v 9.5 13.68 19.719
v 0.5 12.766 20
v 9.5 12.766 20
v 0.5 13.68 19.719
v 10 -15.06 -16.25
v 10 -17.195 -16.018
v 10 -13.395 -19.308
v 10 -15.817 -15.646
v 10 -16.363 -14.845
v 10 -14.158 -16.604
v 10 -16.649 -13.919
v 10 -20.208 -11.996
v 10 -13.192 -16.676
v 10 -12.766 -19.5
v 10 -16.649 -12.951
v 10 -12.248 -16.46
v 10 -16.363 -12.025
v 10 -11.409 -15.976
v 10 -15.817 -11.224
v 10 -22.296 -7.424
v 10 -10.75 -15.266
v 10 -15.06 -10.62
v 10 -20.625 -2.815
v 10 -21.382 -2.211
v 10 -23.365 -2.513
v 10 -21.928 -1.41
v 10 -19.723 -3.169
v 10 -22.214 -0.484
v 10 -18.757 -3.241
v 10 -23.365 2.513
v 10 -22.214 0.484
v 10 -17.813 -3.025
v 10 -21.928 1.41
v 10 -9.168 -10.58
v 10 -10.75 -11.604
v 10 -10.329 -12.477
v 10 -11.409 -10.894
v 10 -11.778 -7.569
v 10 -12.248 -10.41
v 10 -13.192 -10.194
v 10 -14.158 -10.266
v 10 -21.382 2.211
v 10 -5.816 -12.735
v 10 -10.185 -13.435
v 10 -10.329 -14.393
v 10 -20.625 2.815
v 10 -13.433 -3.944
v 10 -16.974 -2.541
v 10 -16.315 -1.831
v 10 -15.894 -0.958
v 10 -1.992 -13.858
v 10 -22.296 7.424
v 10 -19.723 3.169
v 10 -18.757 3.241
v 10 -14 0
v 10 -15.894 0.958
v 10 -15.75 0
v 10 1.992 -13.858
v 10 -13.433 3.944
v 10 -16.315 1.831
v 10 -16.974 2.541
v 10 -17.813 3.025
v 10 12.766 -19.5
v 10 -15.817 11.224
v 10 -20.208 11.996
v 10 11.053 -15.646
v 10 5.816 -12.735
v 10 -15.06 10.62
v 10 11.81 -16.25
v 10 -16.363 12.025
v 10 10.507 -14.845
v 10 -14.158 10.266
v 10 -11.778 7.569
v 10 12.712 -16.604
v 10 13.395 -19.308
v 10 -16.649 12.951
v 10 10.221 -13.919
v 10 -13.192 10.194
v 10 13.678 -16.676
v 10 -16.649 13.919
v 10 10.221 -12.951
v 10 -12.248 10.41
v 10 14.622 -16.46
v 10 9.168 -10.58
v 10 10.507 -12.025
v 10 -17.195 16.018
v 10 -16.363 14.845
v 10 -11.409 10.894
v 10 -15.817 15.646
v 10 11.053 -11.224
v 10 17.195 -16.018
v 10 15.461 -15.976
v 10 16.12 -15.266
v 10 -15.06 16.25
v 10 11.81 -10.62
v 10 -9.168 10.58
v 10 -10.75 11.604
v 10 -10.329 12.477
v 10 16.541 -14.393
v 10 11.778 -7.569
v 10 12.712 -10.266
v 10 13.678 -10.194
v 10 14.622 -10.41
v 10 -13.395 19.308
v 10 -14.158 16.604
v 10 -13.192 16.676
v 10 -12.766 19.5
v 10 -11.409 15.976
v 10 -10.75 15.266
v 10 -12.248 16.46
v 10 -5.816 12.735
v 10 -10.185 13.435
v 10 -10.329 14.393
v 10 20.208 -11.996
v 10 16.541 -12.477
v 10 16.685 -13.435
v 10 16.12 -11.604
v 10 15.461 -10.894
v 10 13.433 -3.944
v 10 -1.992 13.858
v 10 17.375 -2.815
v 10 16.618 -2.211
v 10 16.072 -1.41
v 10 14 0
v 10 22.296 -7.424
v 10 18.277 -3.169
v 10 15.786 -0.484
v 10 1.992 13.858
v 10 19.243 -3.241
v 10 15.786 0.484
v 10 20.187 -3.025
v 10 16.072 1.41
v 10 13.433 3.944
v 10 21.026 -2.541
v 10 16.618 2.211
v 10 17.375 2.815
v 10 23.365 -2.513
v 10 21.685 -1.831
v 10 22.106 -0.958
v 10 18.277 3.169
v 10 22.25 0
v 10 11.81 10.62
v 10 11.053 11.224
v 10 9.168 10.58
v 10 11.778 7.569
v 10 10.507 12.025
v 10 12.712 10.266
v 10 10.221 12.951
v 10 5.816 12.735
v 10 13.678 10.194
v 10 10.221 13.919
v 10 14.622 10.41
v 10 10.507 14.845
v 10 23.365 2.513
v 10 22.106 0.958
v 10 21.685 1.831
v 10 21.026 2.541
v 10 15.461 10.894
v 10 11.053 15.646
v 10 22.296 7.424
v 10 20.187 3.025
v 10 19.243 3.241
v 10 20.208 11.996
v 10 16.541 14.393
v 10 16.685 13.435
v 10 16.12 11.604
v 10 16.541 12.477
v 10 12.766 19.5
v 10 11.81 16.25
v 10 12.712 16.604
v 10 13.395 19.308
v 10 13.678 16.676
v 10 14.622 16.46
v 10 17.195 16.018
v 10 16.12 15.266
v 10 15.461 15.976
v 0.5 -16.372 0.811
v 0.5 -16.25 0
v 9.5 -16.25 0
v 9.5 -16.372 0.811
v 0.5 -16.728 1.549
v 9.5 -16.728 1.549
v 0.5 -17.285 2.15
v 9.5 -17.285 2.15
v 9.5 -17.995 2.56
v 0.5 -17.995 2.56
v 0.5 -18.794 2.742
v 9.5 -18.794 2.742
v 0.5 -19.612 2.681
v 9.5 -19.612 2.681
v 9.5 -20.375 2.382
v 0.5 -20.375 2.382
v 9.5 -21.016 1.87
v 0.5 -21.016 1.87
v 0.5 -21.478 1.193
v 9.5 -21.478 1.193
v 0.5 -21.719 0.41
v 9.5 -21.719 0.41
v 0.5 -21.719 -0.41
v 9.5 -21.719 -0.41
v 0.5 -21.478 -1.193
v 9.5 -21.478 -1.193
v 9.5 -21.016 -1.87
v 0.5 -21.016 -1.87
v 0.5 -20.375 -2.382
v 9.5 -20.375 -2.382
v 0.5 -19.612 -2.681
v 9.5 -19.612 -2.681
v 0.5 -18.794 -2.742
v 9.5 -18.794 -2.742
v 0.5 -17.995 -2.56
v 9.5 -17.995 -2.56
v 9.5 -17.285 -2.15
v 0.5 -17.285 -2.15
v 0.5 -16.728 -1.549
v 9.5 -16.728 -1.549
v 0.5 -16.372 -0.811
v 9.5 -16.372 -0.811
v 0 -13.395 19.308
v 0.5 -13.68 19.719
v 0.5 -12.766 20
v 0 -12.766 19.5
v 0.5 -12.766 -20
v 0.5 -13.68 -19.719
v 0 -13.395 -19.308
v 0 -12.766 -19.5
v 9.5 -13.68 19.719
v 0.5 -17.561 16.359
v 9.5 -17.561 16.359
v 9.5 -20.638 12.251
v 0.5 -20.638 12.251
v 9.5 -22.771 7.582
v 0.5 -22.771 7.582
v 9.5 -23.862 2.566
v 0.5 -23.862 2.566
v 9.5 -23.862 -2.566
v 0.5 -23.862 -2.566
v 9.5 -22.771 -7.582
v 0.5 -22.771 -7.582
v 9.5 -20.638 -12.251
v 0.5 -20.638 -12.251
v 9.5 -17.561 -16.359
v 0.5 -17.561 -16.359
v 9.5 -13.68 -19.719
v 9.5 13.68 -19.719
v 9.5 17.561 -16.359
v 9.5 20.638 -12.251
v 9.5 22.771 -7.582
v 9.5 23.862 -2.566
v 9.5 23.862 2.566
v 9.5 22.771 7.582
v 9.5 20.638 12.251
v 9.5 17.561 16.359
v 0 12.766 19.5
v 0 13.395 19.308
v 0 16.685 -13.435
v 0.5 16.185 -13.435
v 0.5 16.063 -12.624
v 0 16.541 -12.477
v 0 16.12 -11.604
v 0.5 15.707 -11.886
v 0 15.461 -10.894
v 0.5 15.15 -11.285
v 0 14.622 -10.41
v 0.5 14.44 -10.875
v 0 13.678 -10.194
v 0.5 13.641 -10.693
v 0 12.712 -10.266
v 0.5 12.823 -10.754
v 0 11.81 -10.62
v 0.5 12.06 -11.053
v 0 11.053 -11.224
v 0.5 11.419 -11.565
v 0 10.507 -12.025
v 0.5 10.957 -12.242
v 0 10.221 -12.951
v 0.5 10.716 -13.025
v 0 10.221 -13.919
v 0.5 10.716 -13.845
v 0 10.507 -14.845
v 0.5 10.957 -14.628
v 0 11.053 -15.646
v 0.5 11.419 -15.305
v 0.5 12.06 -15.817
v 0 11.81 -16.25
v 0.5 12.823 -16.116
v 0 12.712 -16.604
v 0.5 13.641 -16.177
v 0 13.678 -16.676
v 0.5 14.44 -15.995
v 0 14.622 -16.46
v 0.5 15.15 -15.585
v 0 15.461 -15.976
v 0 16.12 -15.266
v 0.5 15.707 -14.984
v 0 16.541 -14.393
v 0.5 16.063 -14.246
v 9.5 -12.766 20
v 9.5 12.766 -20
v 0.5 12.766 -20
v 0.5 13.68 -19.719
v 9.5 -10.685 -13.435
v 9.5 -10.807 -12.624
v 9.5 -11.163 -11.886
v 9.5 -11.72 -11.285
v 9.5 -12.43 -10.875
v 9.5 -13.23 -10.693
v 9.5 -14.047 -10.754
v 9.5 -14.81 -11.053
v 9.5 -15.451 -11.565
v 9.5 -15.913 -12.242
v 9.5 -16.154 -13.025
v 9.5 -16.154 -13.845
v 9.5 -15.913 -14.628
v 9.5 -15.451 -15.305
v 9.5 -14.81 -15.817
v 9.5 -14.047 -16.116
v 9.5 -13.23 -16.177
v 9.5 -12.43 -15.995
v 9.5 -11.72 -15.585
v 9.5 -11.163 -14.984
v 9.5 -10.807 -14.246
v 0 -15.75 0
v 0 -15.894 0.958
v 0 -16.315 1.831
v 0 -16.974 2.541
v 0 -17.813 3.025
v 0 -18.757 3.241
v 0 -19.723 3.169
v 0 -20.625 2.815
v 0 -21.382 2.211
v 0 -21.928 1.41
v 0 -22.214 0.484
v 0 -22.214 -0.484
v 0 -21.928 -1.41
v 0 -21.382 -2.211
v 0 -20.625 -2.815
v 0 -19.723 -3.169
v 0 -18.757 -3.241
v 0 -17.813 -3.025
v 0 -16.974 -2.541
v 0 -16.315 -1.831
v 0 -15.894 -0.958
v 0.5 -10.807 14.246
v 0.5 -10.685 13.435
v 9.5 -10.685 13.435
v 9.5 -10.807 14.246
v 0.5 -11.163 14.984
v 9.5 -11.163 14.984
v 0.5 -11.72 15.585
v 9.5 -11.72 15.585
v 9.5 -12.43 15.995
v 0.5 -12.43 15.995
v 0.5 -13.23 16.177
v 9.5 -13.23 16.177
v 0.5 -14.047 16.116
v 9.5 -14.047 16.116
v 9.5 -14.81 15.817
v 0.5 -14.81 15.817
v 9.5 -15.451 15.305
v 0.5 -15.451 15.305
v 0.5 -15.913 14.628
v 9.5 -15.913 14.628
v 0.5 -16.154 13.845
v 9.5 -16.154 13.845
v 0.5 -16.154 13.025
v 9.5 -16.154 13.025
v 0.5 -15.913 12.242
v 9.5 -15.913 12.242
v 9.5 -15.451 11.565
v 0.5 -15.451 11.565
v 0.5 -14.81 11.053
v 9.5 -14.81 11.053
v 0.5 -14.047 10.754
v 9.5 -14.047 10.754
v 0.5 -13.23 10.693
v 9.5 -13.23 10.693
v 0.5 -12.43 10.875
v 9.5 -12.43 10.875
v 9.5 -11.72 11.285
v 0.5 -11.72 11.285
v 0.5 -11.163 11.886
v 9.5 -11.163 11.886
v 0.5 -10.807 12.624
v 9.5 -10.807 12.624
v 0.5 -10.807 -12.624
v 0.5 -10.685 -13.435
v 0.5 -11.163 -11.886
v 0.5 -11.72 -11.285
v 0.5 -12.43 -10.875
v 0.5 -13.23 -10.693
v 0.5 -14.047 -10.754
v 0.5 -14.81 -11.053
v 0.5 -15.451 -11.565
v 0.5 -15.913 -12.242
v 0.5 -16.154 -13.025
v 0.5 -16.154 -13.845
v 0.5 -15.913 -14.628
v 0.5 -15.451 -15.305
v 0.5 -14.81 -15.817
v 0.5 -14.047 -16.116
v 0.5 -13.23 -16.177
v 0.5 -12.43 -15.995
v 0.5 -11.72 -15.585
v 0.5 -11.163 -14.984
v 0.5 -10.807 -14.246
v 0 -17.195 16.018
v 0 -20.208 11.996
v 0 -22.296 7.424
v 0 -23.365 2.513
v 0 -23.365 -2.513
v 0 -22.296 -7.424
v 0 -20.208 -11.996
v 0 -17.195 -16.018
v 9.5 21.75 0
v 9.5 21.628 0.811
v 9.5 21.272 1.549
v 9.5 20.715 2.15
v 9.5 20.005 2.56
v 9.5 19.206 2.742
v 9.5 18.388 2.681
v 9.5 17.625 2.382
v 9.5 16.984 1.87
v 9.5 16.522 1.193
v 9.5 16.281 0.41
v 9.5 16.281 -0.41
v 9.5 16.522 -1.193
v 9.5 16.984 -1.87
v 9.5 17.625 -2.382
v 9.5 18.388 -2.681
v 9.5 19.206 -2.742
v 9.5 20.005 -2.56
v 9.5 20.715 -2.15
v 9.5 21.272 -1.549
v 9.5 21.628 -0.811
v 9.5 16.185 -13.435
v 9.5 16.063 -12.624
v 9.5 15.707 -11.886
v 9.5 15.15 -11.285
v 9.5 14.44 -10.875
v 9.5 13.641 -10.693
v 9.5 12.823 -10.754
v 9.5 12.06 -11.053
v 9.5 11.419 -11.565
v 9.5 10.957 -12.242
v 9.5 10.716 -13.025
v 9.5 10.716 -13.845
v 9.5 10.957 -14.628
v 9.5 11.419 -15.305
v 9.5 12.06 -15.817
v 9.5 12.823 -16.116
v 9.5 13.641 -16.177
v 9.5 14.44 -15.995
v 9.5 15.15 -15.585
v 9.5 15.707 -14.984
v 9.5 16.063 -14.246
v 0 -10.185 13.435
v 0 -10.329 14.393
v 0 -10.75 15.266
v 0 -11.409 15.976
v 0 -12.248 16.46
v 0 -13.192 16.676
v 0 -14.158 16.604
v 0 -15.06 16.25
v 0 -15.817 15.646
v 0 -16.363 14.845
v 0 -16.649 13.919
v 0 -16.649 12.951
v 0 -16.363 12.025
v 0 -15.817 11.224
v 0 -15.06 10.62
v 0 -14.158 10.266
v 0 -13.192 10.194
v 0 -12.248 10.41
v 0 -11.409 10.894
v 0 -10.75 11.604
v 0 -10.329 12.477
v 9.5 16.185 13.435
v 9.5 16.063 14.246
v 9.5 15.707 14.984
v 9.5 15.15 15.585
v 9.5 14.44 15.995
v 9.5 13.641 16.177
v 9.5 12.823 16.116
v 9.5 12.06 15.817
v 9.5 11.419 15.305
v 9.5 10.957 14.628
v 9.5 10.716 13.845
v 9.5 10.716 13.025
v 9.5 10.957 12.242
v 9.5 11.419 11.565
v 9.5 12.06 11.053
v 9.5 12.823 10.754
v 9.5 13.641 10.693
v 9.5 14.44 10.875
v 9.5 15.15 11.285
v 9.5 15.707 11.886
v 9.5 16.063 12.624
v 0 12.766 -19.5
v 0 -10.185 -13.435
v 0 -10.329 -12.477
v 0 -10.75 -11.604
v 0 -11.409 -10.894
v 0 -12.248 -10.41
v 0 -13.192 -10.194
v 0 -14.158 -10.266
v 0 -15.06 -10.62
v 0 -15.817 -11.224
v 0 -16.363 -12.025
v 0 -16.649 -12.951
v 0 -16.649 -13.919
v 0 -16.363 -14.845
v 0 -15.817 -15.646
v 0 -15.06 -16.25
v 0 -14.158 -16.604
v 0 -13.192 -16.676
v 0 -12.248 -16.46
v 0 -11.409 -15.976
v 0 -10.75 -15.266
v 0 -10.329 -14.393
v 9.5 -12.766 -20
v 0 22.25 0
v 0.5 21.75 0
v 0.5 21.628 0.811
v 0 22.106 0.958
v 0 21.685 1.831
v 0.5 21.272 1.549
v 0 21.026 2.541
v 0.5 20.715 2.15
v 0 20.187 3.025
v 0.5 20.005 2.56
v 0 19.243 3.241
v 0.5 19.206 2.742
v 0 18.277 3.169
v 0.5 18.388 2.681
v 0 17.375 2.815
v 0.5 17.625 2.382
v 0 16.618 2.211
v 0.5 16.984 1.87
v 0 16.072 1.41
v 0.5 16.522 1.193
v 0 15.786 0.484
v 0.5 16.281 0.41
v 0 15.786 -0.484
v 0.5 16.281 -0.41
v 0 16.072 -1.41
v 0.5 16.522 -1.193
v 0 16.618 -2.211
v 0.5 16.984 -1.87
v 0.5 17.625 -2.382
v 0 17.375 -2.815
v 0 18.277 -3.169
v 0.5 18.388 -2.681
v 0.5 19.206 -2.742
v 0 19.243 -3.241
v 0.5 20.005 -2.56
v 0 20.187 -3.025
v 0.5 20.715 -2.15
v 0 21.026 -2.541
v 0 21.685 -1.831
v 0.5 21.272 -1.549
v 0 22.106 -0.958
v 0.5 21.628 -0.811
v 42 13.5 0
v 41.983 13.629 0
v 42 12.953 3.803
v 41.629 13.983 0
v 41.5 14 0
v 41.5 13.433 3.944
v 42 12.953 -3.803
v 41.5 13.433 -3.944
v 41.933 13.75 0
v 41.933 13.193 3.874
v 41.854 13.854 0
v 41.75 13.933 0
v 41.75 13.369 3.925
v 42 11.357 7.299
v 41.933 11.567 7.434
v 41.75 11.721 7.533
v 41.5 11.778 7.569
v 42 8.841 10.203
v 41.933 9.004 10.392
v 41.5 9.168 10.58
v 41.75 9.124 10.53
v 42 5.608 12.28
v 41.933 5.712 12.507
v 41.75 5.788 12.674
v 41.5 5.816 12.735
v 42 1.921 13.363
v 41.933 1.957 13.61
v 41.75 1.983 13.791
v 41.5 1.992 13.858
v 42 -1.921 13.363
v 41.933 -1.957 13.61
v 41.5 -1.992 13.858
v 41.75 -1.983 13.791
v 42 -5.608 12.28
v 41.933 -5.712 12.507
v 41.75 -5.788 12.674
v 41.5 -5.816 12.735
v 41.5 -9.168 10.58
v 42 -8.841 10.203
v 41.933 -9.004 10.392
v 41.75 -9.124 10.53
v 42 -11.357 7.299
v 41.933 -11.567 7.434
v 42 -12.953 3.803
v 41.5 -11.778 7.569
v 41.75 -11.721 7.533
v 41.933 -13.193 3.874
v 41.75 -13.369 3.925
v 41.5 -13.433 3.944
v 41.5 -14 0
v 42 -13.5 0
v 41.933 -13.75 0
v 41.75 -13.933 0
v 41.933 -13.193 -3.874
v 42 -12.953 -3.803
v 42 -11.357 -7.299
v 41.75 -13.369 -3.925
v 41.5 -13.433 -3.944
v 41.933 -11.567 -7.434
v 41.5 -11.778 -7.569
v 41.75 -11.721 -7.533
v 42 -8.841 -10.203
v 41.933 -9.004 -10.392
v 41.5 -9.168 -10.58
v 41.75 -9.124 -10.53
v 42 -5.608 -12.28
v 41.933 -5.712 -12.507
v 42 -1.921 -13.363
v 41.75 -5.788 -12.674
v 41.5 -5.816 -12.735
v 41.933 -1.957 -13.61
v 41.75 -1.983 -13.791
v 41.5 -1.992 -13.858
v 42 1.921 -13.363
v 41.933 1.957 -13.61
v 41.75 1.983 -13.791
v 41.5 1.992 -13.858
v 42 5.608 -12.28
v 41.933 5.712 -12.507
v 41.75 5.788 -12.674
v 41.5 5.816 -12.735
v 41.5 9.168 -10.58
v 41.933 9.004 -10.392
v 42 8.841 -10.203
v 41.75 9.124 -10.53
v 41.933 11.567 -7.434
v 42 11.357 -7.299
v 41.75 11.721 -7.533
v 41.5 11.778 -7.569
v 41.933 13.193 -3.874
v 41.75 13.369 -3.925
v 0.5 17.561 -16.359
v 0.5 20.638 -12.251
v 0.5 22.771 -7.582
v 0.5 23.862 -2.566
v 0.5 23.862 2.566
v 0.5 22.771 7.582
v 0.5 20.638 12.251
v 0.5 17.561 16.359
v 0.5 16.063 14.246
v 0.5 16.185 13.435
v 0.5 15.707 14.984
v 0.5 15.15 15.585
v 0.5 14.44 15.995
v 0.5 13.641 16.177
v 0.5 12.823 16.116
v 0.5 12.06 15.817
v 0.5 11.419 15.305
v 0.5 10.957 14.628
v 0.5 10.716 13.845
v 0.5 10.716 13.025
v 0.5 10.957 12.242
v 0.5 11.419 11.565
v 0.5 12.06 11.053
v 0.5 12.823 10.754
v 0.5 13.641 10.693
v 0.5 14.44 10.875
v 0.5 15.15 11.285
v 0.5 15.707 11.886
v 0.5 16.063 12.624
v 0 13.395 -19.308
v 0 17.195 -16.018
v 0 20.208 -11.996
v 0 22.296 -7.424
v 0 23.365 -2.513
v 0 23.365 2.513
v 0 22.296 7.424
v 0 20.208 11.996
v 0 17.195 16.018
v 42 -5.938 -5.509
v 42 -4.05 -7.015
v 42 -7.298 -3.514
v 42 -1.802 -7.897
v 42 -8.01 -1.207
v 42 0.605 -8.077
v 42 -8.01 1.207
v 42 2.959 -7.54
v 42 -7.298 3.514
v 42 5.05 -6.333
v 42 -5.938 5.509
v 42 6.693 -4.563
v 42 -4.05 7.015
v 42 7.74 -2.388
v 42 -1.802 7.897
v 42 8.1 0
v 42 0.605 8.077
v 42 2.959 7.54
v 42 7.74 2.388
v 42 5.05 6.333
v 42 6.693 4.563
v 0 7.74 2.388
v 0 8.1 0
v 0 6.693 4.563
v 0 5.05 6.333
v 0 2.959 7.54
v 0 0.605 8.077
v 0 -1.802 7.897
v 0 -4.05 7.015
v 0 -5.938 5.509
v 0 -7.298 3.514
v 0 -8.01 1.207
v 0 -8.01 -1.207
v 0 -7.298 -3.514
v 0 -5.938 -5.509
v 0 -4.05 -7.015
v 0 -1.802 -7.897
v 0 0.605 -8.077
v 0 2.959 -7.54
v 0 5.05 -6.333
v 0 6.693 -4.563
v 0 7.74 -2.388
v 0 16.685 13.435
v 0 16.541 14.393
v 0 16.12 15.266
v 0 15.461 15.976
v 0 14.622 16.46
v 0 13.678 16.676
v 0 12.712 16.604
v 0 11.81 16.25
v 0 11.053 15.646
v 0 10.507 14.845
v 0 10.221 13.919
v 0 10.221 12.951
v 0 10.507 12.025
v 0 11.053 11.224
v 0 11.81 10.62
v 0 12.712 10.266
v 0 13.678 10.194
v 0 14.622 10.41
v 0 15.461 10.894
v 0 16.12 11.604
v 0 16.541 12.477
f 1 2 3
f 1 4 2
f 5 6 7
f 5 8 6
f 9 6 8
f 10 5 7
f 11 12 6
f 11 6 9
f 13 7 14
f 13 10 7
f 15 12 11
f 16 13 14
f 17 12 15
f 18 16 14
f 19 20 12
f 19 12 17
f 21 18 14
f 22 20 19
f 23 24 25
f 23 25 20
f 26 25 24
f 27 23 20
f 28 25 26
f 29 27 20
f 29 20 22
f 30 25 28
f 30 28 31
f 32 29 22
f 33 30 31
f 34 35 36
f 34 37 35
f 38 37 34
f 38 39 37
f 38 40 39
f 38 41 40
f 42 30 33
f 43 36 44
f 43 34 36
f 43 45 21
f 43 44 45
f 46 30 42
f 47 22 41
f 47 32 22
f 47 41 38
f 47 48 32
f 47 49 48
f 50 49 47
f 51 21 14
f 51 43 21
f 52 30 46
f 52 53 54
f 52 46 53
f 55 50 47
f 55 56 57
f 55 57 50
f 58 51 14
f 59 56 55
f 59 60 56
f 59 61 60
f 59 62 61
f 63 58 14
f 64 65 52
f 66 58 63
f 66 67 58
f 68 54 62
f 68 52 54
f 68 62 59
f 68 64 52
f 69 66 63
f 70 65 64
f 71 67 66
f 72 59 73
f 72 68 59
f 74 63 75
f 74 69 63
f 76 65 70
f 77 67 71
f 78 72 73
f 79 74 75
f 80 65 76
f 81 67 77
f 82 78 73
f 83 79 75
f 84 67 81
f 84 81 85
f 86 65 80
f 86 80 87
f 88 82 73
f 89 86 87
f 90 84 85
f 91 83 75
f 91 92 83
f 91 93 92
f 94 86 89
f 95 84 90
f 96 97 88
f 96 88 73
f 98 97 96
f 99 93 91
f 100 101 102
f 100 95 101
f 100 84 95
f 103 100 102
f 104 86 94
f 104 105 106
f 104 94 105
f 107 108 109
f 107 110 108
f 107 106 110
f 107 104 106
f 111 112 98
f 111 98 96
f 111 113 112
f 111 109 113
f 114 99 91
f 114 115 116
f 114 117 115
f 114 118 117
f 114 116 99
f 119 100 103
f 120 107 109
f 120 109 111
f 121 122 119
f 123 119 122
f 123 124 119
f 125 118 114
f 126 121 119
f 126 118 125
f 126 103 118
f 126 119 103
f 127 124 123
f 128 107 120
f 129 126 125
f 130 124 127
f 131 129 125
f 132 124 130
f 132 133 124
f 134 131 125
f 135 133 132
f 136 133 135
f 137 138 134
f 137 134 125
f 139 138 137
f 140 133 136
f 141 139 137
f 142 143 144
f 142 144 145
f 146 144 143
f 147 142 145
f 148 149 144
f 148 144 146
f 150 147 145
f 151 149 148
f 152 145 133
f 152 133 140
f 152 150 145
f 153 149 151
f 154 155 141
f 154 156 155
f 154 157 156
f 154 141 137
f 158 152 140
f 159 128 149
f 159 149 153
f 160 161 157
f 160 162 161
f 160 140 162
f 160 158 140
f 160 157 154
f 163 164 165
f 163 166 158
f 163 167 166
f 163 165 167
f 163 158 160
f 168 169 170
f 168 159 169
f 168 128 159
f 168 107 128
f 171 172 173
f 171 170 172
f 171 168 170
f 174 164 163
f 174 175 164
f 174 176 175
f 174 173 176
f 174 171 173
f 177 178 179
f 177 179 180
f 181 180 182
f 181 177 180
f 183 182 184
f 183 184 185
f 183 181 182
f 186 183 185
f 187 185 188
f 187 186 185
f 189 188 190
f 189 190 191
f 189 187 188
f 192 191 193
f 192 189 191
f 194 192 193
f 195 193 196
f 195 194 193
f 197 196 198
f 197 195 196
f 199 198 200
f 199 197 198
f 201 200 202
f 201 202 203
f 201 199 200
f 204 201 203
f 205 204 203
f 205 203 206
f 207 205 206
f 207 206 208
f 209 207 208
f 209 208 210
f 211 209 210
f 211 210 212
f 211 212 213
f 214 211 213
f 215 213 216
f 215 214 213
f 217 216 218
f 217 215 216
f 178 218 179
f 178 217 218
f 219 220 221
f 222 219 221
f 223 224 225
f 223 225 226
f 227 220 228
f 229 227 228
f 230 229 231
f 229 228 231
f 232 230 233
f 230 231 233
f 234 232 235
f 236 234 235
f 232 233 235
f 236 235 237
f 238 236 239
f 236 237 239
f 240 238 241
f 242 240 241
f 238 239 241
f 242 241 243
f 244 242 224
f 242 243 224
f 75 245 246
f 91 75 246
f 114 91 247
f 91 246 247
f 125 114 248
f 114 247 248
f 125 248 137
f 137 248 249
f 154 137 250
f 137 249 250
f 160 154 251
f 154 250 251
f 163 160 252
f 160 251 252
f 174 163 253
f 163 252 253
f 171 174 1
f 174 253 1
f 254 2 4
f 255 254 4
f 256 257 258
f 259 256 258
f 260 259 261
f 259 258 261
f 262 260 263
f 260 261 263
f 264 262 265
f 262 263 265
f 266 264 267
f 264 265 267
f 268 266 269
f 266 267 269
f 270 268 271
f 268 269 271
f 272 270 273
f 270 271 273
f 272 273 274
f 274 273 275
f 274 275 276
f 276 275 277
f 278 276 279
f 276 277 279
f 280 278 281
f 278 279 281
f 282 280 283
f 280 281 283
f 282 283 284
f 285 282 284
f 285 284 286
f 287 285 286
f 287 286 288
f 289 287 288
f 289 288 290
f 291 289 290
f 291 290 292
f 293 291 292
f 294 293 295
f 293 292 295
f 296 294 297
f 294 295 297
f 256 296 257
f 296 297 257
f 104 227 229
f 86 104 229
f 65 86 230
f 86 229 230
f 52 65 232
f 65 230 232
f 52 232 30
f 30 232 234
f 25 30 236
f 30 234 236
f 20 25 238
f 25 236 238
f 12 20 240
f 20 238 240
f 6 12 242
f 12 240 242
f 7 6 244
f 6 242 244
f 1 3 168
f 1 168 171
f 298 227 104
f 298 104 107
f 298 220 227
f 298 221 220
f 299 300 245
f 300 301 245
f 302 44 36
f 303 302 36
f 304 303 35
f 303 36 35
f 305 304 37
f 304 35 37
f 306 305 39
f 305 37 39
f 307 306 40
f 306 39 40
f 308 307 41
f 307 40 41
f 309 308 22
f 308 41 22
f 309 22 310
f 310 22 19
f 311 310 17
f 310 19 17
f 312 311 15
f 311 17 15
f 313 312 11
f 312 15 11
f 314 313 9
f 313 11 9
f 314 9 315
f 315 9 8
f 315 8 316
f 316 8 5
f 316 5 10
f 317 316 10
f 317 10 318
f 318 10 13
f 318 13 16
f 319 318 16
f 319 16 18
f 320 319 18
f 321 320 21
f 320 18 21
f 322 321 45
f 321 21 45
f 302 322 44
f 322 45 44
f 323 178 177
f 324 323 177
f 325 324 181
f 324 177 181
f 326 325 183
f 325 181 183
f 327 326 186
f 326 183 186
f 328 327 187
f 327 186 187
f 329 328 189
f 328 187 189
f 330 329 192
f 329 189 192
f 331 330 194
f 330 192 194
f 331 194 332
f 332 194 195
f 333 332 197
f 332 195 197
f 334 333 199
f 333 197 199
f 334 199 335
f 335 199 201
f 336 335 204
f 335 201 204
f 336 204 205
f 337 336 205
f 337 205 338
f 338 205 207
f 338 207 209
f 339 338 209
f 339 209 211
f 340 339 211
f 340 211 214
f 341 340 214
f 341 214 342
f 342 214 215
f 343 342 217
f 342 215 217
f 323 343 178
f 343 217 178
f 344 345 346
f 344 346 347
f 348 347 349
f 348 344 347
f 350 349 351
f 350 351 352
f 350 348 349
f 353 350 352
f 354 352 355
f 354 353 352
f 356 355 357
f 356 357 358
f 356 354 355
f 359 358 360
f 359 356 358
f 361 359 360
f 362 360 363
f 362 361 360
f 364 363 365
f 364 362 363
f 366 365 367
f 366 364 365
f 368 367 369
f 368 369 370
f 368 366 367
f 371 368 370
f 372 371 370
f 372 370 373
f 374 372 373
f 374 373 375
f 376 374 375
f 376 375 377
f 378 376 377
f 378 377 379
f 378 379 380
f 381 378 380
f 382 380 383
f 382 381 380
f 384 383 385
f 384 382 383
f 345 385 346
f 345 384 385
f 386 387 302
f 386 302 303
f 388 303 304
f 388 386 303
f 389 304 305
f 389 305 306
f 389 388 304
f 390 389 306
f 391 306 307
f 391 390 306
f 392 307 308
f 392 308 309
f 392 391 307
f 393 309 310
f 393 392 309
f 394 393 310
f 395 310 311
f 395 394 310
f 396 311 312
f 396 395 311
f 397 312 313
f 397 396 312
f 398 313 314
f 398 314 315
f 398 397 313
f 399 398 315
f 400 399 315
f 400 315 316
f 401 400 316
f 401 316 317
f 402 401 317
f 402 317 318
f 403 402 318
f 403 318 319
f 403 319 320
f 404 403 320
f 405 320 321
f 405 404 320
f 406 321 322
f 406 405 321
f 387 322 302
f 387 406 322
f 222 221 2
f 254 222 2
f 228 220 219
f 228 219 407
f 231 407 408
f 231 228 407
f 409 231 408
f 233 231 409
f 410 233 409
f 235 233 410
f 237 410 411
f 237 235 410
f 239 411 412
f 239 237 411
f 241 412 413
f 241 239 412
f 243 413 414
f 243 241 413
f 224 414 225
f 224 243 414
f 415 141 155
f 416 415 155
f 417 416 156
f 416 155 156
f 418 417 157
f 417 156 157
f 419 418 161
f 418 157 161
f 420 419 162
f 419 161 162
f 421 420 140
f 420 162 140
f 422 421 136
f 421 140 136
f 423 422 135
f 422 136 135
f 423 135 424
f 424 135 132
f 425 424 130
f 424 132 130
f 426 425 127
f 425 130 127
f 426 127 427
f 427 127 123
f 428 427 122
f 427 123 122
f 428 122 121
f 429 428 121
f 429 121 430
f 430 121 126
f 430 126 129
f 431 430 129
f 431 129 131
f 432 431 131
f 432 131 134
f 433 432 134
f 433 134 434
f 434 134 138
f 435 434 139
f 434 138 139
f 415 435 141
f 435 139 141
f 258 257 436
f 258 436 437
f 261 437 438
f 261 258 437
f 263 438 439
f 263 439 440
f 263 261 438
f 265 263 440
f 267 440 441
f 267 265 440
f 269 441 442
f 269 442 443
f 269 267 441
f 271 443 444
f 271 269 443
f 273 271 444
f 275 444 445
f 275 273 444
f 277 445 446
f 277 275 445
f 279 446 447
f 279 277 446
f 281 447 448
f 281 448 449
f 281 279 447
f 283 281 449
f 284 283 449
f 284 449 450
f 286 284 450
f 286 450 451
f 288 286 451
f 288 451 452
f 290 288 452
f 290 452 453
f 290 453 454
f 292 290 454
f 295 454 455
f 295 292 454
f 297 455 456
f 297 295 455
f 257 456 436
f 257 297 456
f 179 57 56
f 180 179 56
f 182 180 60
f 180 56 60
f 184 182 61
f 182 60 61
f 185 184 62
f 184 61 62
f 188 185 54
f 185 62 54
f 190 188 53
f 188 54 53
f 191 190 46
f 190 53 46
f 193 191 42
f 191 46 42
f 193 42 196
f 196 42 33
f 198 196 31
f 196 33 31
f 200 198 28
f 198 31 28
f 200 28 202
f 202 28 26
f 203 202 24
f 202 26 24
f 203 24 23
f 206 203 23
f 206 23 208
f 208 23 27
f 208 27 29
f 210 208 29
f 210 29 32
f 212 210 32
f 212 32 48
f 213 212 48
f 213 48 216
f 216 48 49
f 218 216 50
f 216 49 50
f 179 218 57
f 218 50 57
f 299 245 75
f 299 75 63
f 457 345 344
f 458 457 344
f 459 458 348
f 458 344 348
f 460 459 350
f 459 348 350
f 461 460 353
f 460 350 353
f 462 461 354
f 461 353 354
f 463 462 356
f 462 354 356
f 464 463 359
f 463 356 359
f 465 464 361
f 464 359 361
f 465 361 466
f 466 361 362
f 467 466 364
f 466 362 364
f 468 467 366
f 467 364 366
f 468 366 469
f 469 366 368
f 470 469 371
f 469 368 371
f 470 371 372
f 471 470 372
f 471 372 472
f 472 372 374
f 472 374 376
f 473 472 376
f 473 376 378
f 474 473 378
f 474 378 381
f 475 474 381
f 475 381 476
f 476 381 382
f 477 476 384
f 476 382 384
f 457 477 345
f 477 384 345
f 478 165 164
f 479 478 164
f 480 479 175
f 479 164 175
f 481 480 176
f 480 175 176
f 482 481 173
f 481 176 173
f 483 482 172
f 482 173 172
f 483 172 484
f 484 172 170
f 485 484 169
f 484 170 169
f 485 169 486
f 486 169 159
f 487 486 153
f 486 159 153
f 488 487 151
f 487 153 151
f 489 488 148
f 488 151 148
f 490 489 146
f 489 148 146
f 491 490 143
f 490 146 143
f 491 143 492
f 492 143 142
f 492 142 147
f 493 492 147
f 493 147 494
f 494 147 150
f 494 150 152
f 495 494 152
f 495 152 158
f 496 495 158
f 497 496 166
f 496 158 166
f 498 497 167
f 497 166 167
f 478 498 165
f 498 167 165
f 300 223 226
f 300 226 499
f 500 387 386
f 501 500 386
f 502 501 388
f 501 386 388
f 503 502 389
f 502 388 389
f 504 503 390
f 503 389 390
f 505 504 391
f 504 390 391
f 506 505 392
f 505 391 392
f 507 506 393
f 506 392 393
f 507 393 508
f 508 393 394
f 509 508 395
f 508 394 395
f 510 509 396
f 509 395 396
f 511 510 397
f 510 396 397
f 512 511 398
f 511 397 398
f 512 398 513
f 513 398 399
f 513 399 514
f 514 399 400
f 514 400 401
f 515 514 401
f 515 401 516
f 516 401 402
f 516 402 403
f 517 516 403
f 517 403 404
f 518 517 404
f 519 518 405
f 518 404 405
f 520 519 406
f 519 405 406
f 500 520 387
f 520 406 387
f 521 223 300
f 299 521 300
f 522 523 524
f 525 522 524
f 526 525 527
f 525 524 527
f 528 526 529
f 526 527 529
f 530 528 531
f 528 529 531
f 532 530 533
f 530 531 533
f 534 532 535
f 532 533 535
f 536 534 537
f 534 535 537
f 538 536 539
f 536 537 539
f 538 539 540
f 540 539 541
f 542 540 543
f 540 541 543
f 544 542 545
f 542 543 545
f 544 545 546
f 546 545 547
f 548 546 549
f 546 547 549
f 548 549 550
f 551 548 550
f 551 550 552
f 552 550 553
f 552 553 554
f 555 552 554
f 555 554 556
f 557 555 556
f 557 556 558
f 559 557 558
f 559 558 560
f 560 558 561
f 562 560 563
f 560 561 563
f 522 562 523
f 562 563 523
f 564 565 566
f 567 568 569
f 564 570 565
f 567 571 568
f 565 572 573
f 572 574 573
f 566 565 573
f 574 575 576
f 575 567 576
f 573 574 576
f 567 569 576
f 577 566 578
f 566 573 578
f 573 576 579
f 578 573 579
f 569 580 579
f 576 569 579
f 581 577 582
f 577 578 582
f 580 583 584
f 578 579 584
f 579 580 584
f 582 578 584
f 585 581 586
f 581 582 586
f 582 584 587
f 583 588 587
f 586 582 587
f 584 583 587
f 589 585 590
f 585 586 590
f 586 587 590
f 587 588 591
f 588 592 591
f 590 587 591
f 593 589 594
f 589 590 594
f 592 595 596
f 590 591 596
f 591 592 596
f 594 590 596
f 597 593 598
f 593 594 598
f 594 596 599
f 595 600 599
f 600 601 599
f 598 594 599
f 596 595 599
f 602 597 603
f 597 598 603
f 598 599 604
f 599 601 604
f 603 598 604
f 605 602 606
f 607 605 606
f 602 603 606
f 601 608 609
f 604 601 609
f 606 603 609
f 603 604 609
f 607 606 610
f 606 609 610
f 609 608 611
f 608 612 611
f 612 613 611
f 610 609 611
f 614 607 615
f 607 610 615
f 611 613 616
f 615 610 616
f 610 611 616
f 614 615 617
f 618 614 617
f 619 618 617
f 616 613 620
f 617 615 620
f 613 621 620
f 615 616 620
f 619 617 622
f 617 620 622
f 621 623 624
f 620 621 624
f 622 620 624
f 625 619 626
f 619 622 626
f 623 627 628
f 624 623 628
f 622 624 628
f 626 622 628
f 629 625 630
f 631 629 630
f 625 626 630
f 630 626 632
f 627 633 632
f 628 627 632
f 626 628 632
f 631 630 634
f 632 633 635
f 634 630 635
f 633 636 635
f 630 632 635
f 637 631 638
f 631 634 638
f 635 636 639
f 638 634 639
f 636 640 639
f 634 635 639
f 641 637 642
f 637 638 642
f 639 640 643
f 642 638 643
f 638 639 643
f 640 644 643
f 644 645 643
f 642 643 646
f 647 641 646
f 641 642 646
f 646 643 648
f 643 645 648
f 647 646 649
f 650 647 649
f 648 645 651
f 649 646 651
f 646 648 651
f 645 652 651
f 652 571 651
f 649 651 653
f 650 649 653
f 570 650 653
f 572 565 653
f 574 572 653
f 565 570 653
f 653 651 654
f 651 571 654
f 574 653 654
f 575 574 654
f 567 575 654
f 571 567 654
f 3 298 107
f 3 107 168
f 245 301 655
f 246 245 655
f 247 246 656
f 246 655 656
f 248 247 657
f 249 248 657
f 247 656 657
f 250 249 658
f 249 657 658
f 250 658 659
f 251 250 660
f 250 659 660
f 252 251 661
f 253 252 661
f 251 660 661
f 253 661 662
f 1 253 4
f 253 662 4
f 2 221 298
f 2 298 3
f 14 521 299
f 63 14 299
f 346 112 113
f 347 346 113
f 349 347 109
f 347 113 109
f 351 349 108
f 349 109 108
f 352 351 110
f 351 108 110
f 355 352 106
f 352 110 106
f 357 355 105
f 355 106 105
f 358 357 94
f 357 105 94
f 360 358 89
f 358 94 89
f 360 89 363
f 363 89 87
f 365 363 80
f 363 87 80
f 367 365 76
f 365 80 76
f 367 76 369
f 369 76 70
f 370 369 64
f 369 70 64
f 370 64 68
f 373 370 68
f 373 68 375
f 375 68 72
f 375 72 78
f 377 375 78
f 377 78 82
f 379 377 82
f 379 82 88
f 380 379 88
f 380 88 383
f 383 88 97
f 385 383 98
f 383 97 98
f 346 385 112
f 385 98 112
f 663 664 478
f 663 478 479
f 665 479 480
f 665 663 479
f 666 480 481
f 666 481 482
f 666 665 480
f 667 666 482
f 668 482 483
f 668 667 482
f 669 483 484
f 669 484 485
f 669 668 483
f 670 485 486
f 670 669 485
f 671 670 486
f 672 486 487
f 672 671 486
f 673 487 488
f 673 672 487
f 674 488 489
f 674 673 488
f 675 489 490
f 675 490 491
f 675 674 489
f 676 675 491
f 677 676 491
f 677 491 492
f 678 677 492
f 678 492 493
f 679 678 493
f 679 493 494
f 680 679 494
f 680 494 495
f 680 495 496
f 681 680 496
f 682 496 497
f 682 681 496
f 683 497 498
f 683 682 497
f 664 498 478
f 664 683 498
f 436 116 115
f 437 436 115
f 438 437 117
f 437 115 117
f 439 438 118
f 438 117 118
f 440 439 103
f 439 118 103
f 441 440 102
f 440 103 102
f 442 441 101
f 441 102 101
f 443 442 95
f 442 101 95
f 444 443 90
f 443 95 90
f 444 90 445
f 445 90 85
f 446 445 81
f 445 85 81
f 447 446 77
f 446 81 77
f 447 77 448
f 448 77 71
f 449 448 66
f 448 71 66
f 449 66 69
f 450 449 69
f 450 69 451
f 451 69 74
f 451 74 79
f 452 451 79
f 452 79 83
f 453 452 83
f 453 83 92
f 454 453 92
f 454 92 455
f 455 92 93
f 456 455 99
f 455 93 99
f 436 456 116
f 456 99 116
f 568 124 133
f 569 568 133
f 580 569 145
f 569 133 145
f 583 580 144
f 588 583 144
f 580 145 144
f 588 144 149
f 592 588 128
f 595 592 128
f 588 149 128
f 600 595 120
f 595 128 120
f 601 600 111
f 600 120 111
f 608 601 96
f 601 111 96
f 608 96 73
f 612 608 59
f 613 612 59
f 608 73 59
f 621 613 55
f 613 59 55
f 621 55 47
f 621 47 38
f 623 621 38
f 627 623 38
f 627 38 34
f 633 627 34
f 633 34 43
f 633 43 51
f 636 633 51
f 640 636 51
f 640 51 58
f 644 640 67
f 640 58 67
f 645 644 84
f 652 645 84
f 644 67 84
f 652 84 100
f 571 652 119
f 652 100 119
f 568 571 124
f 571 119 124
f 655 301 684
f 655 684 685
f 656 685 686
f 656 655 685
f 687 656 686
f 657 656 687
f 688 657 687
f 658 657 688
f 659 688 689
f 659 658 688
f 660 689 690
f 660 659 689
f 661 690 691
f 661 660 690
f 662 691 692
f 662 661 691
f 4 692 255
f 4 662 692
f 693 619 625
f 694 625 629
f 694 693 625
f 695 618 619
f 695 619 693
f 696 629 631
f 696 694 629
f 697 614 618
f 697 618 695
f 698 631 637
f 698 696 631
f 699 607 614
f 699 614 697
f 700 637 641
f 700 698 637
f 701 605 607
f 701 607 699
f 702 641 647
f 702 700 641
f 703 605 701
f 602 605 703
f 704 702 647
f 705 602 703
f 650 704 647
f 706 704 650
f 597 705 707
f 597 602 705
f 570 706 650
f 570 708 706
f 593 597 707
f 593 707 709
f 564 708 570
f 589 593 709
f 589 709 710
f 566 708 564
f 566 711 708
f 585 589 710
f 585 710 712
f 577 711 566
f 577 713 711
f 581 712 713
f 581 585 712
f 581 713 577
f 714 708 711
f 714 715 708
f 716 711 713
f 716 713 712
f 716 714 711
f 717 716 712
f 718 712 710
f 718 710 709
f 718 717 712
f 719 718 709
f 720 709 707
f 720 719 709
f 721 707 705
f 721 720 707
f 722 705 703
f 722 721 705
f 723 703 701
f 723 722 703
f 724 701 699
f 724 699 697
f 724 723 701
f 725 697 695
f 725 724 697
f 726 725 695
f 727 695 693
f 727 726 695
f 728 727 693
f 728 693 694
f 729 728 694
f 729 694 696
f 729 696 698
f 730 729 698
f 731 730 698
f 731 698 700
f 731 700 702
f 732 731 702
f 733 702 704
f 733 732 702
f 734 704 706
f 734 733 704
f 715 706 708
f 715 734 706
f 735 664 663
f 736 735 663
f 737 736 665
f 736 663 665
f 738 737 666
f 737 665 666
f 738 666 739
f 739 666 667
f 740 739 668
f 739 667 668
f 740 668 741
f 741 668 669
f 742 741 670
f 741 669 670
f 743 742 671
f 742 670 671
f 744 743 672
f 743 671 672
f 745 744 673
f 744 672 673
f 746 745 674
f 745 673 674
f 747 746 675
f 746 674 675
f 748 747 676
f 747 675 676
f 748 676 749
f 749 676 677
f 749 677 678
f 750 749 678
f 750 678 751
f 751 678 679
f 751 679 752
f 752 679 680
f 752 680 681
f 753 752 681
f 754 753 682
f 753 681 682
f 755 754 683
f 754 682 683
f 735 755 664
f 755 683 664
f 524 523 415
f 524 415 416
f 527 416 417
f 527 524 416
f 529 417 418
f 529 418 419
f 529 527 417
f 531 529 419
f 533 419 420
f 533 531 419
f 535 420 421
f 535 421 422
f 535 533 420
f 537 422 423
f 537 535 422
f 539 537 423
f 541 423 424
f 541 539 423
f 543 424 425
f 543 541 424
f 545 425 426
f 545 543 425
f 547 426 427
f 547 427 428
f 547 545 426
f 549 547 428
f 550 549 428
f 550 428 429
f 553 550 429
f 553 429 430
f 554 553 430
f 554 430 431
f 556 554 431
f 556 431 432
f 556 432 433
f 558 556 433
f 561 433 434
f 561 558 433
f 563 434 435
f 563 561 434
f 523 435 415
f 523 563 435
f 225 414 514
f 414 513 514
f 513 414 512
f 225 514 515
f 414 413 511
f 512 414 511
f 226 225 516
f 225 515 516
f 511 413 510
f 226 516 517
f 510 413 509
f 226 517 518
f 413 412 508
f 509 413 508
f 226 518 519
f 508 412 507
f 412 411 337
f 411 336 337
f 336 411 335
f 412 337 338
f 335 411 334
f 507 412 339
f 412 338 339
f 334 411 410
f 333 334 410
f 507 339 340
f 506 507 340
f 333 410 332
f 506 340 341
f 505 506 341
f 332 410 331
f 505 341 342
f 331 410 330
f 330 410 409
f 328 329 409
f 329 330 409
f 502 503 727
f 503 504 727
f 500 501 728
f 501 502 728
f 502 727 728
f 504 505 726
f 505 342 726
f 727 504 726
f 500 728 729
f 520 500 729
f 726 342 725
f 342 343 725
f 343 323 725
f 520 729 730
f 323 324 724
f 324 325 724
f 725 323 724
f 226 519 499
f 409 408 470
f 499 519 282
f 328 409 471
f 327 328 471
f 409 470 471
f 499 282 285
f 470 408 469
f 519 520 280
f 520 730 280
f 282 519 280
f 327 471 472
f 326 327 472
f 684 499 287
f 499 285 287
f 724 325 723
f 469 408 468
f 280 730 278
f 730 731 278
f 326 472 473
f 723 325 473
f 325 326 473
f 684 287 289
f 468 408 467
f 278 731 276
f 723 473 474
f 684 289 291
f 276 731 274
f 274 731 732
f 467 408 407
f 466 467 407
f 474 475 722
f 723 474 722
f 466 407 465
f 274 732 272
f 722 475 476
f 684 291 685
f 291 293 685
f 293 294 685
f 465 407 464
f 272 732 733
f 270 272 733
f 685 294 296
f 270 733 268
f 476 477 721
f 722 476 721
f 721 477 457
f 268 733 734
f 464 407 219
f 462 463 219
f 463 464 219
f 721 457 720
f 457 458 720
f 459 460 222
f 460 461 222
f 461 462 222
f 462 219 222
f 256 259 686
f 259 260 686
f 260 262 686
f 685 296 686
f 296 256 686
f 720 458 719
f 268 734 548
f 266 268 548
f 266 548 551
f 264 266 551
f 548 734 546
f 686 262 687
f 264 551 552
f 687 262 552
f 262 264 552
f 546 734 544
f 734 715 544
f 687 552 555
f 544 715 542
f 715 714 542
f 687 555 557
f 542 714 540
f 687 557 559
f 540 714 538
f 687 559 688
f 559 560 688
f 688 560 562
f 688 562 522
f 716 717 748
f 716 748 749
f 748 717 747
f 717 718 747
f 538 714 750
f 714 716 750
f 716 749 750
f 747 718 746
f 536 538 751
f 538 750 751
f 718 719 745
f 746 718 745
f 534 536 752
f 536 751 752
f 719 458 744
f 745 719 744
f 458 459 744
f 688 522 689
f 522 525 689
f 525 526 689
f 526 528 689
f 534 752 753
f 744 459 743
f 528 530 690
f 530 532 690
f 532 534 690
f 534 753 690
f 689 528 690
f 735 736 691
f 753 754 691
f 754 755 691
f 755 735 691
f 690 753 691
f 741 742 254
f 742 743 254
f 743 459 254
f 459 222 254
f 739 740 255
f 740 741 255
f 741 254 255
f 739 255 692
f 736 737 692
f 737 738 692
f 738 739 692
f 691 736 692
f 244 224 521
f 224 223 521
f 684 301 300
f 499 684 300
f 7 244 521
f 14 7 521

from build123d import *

# Parameters (mm, degrees)
SKETCH_R        = 2.75
SKETCH_R_2      = 8.1
PAD_DEPTH       = 10
SKETCH001_R     = 14
SKETCH001_R_2   = 8.1
PAD001_DEPTH    = 32
CHAMFER_SIZE    = 0.5
FILLET_R        = 0.5
CHAMFER001_SIZE = 0.5


with BuildPart() as part:
    # Sketch → Pad (new body)
    with BuildSketch(Plane.YZ):
        with BuildLine():
            ThreePointArc((-13.266499, 20), (-24, 0), (-13.266499, -20))
            Line((-13.266499, -20), (13.266499, -20))
            ThreePointArc((13.266499, -20), (24, 0), (13.266499, 20))
            Line((-13.266499, 20), (13.266499, 20))
        make_face()
        with Locations((-13.435058, 13.435)):
            Circle(SKETCH_R, mode=Mode.SUBTRACT)
        with Locations((-19, 0)):
            Circle(SKETCH_R, mode=Mode.SUBTRACT)
        with Locations((-13.435058, -13.435)):
            Circle(SKETCH_R, mode=Mode.SUBTRACT)
        with Locations((13.435058, 13.435)):
            Circle(SKETCH_R, mode=Mode.SUBTRACT)
        with Locations((19, 0)):
            Circle(SKETCH_R, mode=Mode.SUBTRACT)
        with Locations((13.435058, -13.435)):
            Circle(SKETCH_R, mode=Mode.SUBTRACT)
        Circle(SKETCH_R_2, mode=Mode.SUBTRACT)
    extrude(amount=PAD_DEPTH)

    # Sketch001 → Pad001 (new body)
    with BuildSketch(Plane.YZ.offset(10)):
        Circle(SKETCH001_R)
        Circle(SKETCH001_R_2, mode=Mode.SUBTRACT)
    extrude(amount=PAD001_DEPTH)

    # Chamfer
    chamfer_edges = [part.edges().sort_by_distance(p)[0] for p in [
        (0, -16.185058, -13.435),
        (10, -16.185058, -13.435),
        (0, -21.75, 0),
        (10, -21.75, 0),
        (0, -16.185058, 13.435),
        (10, -16.185058, 13.435),
        (0, 10.685058, 13.435),
        (10, 10.685058, 13.435),
        (0, 16.25, 0),
        (10, 16.25, 0),
        (0, 10.685058, -13.435),
        (10, 10.685058, -13.435),
    ]]
    chamfer(chamfer_edges, length=CHAMFER_SIZE)

    # Fillet
    fillet_edges = [part.edges().sort_by_distance(p)[0] for p in [
        (42, -14, 0),
    ]]
    fillet(fillet_edges, radius=FILLET_R)

    # Chamfer001
    chamfer001_edges = [part.edges().sort_by_distance(p)[0] for p in [
        (5, -13.266499, 20),
        (5, -13.266499, -20),
        (0, -24, 0),
        (10, -24, 0),
        (5, 13.266499, 20),
        (0, 0, 20),
        (10, 0, 20),
        (5, 13.266499, -20),
        (0, 24, 0),
        (10, 24, 0),
        (0, 0, -20),
        (10, 0, -20),
    ]]
    chamfer(chamfer001_edges, length=CHAMFER001_SIZE)


solid = part.part
